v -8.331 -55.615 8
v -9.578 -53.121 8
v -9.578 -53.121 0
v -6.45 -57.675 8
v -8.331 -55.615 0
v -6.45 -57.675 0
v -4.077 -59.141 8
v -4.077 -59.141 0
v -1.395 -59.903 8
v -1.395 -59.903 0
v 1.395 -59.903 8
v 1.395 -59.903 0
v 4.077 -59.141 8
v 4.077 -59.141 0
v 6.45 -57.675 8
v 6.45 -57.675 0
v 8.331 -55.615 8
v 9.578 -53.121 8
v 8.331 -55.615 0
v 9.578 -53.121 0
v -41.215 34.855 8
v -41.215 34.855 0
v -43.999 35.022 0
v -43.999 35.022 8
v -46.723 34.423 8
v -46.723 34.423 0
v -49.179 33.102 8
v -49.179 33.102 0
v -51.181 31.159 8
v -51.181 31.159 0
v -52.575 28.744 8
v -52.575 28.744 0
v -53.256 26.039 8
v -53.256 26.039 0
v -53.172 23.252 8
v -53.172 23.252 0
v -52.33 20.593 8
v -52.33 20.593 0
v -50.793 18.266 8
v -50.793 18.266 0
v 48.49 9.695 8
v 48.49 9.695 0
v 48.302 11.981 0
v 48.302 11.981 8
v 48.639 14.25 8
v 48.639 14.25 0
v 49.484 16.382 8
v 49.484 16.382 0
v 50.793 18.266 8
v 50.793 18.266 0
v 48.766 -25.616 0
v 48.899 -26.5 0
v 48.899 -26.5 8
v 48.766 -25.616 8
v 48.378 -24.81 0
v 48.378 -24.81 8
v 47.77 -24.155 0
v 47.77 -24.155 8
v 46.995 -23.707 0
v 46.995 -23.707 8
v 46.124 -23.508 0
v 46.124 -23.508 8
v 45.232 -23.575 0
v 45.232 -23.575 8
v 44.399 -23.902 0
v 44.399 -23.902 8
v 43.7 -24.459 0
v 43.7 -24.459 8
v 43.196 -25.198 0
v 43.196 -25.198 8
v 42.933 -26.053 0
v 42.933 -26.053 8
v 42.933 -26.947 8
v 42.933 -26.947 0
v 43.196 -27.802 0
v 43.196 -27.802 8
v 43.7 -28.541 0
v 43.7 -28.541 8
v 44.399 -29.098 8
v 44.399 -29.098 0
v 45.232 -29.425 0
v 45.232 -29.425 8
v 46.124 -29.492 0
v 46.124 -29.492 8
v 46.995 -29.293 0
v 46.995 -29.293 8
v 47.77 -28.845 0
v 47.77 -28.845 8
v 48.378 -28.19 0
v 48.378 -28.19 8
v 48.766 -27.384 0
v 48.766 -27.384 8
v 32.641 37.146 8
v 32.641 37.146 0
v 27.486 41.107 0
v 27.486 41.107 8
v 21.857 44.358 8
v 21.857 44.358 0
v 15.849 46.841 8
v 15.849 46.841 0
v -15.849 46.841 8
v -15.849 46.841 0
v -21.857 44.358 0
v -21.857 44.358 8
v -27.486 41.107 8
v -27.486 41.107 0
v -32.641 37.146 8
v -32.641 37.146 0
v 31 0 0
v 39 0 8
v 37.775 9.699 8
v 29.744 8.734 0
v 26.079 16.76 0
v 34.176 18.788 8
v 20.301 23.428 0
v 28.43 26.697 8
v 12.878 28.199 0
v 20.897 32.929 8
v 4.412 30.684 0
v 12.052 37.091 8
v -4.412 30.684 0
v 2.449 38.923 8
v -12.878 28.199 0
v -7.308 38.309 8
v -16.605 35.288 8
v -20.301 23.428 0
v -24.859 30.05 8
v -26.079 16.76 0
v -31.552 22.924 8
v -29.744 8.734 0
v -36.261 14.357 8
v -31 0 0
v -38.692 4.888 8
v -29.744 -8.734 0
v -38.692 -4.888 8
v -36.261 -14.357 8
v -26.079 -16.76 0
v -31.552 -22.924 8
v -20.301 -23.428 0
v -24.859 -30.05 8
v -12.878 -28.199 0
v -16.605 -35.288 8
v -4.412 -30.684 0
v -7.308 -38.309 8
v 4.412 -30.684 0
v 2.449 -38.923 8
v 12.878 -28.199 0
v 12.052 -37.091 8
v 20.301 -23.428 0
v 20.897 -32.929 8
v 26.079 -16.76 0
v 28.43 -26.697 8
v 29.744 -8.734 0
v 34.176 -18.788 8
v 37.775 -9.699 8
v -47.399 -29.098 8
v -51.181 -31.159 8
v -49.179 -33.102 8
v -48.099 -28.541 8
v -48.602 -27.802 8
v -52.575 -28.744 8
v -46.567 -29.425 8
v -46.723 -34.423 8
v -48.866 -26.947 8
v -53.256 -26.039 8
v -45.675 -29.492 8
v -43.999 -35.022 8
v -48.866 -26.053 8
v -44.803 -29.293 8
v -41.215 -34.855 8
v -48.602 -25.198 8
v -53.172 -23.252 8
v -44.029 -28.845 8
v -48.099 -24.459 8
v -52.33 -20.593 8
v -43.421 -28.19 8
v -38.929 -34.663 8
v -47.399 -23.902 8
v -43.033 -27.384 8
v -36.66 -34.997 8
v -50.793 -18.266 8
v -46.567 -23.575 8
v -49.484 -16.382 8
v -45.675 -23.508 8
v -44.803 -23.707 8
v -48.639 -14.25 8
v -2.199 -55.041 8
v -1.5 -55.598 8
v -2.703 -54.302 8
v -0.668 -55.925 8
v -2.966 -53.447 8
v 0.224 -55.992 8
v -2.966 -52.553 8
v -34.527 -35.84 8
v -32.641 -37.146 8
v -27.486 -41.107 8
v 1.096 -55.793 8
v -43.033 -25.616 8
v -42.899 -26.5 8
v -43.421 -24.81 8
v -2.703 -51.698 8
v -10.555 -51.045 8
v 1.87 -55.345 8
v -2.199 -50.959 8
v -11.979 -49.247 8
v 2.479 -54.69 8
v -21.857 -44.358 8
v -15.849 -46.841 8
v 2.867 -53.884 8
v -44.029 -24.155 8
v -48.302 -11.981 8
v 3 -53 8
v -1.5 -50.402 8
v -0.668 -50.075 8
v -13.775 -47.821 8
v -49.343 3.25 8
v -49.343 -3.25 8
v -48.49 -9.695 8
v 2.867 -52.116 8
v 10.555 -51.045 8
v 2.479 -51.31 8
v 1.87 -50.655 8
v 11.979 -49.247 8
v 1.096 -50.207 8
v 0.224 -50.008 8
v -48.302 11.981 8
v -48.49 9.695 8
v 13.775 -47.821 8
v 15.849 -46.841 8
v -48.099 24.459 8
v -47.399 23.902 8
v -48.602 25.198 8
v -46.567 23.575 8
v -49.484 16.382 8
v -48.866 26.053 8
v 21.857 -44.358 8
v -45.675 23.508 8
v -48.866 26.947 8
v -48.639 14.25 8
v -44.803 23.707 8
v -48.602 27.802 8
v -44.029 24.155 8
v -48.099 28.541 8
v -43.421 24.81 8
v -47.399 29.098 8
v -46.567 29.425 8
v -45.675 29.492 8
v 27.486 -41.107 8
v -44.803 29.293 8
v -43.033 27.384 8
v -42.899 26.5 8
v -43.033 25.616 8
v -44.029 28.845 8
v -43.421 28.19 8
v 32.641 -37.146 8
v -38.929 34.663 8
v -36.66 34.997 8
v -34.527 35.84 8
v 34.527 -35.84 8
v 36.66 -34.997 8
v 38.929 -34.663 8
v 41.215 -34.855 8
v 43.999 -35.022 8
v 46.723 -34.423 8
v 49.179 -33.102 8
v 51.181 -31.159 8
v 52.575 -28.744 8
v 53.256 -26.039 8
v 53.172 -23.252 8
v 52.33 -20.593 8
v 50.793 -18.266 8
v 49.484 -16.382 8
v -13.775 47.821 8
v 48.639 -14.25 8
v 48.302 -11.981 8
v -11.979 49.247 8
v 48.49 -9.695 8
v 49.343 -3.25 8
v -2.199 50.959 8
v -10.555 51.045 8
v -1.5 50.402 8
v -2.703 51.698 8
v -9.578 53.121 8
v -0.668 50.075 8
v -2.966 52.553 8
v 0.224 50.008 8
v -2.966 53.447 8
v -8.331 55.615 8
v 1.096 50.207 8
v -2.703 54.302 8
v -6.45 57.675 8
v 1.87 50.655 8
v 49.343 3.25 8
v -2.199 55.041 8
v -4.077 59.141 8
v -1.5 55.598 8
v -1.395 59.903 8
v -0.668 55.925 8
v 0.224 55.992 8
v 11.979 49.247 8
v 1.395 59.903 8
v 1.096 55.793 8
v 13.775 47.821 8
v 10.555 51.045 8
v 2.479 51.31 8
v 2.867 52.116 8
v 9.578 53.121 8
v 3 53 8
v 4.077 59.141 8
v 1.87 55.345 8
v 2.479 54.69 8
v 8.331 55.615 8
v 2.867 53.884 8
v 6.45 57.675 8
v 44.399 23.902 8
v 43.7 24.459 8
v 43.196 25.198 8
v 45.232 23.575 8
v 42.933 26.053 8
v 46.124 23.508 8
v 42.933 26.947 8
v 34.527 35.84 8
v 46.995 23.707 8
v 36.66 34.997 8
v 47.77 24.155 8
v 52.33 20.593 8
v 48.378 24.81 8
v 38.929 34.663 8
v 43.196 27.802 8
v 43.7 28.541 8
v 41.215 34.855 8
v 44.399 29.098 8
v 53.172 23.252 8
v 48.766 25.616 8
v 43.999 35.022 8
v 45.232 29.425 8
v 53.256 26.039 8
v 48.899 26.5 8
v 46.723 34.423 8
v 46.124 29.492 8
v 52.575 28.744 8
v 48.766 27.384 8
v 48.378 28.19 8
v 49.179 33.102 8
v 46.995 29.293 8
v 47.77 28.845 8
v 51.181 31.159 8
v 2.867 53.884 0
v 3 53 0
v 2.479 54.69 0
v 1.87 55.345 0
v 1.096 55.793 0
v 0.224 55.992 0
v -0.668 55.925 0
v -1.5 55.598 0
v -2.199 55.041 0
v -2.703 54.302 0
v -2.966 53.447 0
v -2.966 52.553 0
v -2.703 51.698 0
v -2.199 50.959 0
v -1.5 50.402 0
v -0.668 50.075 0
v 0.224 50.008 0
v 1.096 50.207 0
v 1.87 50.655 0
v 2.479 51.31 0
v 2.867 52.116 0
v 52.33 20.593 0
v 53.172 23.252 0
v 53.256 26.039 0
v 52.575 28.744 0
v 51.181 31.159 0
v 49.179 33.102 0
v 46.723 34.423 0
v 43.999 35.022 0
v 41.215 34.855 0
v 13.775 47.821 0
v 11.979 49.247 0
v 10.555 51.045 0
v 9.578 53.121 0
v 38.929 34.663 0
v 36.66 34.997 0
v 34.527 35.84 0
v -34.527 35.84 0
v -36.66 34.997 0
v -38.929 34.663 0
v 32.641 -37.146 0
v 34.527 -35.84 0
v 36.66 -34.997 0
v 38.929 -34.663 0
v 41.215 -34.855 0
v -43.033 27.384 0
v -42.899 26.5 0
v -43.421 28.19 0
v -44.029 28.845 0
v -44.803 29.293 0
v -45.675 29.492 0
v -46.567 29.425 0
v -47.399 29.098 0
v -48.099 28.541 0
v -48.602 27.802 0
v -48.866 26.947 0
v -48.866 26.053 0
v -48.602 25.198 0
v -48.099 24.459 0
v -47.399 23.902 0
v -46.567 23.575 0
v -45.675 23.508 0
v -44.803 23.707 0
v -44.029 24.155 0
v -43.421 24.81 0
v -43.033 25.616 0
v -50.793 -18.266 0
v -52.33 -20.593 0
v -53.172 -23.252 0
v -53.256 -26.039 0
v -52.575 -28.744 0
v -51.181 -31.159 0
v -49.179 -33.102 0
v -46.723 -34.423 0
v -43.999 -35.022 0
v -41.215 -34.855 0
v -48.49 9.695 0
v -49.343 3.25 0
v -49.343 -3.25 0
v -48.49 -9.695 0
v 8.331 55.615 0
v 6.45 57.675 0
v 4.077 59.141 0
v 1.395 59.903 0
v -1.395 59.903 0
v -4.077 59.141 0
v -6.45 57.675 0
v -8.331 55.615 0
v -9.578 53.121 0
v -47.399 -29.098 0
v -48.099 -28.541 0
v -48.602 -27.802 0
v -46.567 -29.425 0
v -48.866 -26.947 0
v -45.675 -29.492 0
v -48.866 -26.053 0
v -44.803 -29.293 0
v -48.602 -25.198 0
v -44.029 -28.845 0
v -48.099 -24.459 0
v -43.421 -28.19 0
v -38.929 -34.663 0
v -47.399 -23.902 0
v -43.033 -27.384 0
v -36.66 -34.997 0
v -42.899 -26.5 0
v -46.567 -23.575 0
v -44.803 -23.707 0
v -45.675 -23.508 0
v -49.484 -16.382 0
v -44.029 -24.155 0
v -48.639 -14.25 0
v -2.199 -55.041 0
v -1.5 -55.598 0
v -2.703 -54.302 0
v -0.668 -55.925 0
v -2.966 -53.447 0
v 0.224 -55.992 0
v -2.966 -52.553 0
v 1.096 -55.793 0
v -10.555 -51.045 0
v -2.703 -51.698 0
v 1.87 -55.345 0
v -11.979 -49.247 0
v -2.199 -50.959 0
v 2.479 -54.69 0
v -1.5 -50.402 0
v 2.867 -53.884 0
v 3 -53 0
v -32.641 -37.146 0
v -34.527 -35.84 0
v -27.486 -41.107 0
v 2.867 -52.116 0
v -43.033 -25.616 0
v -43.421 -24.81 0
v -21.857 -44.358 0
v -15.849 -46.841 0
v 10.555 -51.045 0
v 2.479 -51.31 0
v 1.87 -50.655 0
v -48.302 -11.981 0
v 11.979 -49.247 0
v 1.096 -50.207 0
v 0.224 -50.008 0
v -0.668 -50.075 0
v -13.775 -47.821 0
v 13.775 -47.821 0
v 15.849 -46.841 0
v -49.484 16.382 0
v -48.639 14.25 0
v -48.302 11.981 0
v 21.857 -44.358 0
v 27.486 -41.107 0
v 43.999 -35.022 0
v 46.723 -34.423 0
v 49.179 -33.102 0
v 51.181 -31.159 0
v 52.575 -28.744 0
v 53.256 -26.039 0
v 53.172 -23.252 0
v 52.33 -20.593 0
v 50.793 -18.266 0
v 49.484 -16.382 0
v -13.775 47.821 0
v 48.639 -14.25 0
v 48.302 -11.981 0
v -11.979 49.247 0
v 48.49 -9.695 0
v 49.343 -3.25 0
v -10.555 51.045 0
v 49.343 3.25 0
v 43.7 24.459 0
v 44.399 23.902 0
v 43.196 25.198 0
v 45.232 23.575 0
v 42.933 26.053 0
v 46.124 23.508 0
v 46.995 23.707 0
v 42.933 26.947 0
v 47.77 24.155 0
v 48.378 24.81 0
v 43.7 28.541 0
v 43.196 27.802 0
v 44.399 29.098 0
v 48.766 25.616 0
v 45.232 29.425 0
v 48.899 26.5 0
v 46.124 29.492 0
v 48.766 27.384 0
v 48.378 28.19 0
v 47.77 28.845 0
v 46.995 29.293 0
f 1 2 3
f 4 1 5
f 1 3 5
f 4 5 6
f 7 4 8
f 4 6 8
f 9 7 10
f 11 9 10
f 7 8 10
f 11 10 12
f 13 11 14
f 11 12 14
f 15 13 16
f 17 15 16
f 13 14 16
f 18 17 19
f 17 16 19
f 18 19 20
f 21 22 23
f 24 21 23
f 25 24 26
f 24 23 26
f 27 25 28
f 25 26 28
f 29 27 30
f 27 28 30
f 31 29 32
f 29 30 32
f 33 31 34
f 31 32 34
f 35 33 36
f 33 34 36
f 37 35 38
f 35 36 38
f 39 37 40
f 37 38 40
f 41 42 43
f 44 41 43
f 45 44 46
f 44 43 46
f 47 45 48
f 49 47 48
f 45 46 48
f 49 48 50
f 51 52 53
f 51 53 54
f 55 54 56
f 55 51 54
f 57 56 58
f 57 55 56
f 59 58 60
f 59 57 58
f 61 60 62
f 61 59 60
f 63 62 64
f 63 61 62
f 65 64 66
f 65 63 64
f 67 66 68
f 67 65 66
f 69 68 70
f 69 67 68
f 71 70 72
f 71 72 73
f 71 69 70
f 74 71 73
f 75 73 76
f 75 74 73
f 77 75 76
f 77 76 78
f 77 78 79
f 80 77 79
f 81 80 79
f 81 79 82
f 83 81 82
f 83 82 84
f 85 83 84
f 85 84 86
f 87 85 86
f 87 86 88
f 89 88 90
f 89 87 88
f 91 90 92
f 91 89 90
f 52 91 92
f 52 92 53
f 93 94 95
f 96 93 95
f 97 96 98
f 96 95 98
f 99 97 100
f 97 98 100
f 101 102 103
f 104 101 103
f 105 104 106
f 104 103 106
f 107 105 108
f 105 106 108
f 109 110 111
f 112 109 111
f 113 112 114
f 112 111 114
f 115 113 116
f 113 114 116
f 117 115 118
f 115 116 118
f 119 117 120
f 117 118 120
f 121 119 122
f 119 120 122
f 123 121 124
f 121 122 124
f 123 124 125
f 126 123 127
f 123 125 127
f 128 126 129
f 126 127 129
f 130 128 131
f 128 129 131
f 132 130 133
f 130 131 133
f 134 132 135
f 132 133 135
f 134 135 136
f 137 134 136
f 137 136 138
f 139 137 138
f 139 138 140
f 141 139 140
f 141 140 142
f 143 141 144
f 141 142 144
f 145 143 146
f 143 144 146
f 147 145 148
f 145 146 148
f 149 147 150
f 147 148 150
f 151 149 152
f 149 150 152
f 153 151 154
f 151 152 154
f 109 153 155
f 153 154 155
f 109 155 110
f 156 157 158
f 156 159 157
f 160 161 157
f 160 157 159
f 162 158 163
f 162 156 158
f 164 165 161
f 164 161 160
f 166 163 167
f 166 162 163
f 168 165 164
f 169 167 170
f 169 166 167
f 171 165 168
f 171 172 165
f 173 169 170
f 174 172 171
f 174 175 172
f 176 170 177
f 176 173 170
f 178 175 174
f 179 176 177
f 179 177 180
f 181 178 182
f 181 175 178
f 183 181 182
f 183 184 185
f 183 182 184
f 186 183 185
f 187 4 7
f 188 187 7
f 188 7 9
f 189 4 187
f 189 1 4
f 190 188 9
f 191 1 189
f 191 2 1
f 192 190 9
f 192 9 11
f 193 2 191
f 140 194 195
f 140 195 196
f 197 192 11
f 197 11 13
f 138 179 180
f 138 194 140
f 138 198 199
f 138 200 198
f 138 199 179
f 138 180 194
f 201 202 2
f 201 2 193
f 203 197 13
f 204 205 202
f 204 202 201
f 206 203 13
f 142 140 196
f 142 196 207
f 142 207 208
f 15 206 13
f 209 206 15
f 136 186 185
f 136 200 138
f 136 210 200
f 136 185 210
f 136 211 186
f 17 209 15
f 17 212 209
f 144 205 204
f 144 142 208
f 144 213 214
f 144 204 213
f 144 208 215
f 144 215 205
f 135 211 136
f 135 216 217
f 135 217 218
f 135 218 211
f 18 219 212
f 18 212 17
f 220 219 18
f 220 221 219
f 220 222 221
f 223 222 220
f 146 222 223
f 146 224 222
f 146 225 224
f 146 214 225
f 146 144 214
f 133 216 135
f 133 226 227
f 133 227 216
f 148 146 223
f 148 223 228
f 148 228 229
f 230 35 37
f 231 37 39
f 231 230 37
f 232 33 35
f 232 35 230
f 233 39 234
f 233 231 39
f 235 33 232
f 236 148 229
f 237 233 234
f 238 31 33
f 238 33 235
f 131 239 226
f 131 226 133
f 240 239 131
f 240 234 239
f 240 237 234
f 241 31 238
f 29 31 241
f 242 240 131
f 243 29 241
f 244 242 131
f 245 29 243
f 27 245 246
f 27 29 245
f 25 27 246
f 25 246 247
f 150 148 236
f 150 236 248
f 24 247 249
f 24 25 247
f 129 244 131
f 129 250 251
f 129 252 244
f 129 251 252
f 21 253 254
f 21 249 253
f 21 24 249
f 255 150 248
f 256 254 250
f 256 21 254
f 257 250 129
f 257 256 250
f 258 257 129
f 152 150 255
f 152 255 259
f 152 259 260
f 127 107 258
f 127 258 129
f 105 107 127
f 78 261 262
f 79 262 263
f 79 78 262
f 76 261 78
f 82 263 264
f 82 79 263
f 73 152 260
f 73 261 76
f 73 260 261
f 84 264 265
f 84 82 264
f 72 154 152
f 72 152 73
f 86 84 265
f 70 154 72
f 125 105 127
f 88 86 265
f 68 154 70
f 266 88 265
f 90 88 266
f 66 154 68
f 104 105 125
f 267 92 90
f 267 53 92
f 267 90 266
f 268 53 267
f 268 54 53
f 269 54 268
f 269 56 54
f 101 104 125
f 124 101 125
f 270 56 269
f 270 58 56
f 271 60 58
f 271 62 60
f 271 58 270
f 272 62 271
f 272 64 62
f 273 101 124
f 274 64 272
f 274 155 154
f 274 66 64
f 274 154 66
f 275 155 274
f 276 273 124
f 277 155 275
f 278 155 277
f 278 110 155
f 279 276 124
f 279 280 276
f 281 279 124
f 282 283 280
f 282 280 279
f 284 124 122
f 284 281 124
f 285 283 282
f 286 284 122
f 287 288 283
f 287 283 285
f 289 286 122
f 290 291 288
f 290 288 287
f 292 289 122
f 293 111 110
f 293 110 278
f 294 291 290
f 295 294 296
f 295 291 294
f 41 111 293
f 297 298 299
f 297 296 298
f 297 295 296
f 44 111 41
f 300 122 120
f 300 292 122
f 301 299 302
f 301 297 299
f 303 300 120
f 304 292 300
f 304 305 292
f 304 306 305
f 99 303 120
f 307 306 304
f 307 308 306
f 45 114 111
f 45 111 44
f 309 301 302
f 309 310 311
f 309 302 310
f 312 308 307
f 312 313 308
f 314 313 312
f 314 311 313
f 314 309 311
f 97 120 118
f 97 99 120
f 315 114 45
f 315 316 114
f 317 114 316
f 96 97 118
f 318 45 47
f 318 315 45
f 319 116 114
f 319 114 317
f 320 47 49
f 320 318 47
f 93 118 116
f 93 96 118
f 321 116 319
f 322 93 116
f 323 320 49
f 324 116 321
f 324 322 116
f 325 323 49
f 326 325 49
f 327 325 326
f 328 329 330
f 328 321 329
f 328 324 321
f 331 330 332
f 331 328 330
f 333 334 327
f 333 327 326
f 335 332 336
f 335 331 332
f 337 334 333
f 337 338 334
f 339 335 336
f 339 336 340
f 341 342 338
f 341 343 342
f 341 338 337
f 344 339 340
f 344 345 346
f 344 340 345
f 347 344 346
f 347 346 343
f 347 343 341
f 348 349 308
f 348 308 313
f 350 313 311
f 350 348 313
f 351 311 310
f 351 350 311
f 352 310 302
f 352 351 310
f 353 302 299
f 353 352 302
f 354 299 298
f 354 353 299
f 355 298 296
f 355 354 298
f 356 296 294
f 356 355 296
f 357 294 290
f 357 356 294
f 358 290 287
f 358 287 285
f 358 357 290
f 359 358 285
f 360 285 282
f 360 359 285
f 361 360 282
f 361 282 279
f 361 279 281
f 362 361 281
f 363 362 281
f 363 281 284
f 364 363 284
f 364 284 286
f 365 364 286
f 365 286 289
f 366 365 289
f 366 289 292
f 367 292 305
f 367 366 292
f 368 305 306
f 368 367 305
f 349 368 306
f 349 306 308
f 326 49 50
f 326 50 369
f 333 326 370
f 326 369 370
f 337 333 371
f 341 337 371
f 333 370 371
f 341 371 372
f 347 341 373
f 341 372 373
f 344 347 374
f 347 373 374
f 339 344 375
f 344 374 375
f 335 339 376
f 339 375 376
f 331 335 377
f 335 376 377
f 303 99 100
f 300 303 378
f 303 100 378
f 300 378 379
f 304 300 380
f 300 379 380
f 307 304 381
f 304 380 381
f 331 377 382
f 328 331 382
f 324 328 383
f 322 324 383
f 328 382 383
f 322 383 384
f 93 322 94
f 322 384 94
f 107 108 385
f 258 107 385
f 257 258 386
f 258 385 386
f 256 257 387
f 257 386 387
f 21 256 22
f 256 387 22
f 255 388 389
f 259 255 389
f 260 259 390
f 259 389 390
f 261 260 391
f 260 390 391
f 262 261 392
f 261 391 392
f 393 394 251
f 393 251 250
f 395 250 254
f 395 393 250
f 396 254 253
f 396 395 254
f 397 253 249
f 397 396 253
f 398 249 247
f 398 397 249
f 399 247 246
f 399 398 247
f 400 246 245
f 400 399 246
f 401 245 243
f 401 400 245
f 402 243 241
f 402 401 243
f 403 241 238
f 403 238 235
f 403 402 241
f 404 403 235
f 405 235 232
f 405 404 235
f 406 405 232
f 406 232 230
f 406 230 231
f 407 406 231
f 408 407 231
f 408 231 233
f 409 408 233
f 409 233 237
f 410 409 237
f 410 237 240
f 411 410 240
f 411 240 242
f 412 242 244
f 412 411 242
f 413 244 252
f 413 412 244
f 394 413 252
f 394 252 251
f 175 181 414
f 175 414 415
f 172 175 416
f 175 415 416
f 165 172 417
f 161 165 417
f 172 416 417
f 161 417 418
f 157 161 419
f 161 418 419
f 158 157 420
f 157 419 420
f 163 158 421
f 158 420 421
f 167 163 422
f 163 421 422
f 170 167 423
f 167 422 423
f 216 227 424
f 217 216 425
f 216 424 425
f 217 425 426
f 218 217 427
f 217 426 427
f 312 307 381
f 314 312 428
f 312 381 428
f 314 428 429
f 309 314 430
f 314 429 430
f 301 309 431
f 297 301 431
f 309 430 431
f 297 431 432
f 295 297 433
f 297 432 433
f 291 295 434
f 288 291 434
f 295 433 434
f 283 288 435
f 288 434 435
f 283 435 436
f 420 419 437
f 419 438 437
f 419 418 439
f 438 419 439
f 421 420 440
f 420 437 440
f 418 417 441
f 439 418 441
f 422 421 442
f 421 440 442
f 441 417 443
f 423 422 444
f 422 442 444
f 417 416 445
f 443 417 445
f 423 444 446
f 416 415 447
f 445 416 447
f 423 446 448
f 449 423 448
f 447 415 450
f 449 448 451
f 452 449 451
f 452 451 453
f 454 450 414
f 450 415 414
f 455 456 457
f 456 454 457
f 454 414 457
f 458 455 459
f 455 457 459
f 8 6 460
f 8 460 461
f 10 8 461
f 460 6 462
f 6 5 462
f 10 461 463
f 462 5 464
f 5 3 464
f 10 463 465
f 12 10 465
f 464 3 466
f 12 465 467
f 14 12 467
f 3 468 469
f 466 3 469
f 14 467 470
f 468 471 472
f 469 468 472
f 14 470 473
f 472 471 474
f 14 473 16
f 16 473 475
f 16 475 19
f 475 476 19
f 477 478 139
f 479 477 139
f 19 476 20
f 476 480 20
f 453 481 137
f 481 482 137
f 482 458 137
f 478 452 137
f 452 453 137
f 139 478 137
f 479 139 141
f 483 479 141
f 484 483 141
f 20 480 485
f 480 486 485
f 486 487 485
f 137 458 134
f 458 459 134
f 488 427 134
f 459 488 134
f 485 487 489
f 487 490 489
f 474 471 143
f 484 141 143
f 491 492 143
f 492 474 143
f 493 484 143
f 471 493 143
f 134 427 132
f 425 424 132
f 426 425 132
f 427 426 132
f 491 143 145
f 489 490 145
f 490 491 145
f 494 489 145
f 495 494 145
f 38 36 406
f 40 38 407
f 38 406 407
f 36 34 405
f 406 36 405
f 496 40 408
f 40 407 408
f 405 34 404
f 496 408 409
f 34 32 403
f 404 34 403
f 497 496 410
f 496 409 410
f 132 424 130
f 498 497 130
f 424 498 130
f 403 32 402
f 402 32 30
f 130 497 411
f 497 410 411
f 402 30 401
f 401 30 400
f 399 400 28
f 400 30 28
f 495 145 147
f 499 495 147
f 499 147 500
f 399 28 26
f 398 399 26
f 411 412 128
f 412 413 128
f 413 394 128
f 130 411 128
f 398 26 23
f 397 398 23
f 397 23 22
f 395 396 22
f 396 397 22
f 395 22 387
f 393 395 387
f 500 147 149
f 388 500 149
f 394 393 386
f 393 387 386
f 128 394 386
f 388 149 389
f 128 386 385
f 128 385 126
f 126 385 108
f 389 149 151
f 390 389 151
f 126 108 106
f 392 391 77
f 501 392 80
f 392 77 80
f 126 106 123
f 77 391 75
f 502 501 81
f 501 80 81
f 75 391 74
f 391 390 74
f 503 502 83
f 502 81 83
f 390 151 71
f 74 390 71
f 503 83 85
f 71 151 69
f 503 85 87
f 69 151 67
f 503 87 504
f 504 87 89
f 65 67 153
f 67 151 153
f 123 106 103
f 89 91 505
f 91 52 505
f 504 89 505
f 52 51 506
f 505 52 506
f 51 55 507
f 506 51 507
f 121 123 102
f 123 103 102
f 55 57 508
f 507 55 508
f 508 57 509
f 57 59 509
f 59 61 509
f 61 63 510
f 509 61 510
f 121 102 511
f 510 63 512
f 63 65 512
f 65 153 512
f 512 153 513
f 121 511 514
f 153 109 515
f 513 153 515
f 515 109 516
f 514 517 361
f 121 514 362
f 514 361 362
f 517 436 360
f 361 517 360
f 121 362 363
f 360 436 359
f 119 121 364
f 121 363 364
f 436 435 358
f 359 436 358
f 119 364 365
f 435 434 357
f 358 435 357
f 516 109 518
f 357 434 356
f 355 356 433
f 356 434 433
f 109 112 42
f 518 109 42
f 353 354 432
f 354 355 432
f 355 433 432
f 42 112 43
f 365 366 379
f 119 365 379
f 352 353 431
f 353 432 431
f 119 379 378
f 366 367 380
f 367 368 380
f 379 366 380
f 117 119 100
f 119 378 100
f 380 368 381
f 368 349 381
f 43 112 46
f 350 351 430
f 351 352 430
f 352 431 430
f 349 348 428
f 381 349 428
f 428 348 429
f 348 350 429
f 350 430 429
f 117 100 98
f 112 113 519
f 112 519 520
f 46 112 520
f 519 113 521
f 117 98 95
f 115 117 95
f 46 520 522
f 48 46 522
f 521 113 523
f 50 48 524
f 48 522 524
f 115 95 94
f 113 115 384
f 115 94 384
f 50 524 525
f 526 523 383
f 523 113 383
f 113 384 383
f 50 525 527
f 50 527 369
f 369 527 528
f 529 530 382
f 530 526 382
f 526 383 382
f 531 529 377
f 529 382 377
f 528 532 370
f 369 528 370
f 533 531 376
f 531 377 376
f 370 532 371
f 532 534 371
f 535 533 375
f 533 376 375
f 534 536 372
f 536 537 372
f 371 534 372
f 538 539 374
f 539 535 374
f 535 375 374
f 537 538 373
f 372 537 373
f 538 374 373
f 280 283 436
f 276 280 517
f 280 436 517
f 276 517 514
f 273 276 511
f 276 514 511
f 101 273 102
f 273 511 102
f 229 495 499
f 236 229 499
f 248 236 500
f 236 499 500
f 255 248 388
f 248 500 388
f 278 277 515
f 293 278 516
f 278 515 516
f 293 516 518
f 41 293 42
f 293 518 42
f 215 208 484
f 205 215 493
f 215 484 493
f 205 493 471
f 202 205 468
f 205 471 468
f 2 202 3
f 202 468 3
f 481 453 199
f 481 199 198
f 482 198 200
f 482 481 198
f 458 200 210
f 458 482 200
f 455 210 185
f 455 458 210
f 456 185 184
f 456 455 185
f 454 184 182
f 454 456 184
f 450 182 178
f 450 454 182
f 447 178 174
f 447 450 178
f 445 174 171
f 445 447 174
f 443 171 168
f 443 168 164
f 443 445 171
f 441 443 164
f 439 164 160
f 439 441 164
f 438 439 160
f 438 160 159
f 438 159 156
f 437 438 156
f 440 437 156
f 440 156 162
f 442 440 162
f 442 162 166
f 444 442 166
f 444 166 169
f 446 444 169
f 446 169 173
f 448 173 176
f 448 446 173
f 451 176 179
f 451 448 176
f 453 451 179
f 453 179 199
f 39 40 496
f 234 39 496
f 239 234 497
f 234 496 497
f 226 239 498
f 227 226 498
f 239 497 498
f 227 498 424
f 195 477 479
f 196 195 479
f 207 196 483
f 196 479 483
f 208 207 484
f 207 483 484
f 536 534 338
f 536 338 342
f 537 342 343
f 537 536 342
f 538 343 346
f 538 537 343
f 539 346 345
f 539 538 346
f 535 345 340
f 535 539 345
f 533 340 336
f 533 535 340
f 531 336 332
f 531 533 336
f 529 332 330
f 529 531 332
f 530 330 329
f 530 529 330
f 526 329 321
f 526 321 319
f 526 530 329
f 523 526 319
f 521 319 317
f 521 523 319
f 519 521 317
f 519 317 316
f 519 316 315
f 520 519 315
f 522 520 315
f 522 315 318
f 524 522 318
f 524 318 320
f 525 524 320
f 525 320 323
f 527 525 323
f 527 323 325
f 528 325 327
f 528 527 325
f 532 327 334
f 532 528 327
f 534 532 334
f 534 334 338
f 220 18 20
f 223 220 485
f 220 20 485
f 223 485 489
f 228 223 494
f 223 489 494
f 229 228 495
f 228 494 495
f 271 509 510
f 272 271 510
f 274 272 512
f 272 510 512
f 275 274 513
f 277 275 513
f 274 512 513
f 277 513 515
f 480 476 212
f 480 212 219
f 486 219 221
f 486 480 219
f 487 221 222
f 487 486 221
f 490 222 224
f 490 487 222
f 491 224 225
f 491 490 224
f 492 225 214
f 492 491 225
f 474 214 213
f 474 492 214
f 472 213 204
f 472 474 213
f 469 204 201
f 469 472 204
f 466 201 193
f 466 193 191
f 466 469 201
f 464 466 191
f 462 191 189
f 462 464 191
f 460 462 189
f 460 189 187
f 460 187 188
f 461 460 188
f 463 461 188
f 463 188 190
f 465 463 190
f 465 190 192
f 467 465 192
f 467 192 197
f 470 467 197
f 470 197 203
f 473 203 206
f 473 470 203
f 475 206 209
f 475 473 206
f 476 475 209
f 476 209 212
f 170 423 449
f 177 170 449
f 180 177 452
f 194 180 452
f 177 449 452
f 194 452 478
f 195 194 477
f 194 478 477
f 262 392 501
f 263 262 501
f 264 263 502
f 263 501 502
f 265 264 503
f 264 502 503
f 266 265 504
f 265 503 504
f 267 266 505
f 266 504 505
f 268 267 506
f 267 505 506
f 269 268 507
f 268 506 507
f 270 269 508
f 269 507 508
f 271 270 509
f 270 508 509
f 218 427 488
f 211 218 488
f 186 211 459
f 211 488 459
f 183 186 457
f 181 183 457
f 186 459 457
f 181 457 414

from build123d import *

# Parameters (mm, degrees)
SKETCH2_R           = 3
SKETCH2_R_2         = 31
BOSS_EXTRUDE1_DEPTH = 8
CHAMFER1_SIZE       = 8


with BuildPart() as part:
    # Sketch2 → Boss-Extrude1 (new body)
    with BuildSketch(Plane.XY):
        with BuildLine():
            ThreePointArc((50.792573497, 18.265840665), (51.961524227, 30), (41.214968786, 34.85473864))
            ThreePointArc((41.214968786, 34.85473864), (36.65999643, 34.997336465), (32.641290086, 37.146314508))
            ThreePointArc((32.641290086, 37.146314508), (24.725, 42.824956217), (15.849006977, 46.841343681))
            ThreePointArc((15.849006977, 46.841343681), (11.978584229, 49.247156444), (9.577604711, 53.120579305))
            ThreePointArc((9.577604711, 53.120579305), (0, 60), (-9.577604711, 53.120579305))
            ThreePointArc((-9.577604711, 53.120579305), (-11.978584229, 49.247156444), (-15.849006977, 46.841343681))
            ThreePointArc((-15.849006977, 46.841343681), (-24.725, 42.824956217), (-32.641290086, 37.146314508))
            ThreePointArc((-32.641290086, 37.146314508), (-36.65999643, 34.997336465), (-41.214968786, 34.85473864))
            ThreePointArc((-41.214968786, 34.85473864), (-51.961524227, 30), (-50.792573497, 18.265840665))
            ThreePointArc((-50.792573497, 18.265840665), (-48.638580659, 14.249819979), (-48.490297064, 9.695029173))
            ThreePointArc((-48.490297064, 9.695029173), (-49.45, 0), (-48.490297064, -9.695029173))
            ThreePointArc((-48.490297064, -9.695029173), (-48.638580659, -14.249819979), (-50.792573497, -18.265840665))
            ThreePointArc((-50.792573497, -18.265840665), (-51.961524227, -30), (-41.214968786, -34.85473864))
            ThreePointArc((-41.214968786, -34.85473864), (-36.65999643, -34.997336465), (-32.641290086, -37.146314508))
            ThreePointArc((-32.641290086, -37.146314508), (-24.725, -42.824956217), (-15.849006977, -46.841343681))
            ThreePointArc((-15.849006977, -46.841343681), (-11.978584229, -49.247156444), (-9.577604711, -53.120579305))
            ThreePointArc((-9.577604711, -53.120579305), (0, -60), (9.577604711, -53.120579305))
            ThreePointArc((9.577604711, -53.120579305), (11.978584229, -49.247156444), (15.849006977, -46.841343681))
            ThreePointArc((15.849006977, -46.841343681), (24.725, -42.824956217), (32.641290086, -37.146314508))
            ThreePointArc((32.641290086, -37.146314508), (36.65999643, -34.997336465), (41.214968786, -34.85473864))
            ThreePointArc((41.214968786, -34.85473864), (51.961524227, -30), (50.792573497, -18.265840665))
            ThreePointArc((50.792573497, -18.265840665), (48.638580659, -14.249819979), (48.490297064, -9.695029173))
            ThreePointArc((48.490297064, -9.695029173), (49.45, 0), (48.490297064, 9.695029173))
            ThreePointArc((48.490297064, 9.695029173), (48.638580659, 14.249819979), (50.792573497, 18.265840665))
        make_face()
        with Locations((45.899346401, 26.5)):
            Circle(SKETCH2_R, mode=Mode.SUBTRACT)
        with Locations((0, 53)):
            Circle(SKETCH2_R, mode=Mode.SUBTRACT)
        Circle(SKETCH2_R_2, mode=Mode.SUBTRACT)
        with Locations((45.899346401, -26.5)):
            Circle(SKETCH2_R, mode=Mode.SUBTRACT)
        with Locations((0, -53)):
            Circle(SKETCH2_R, mode=Mode.SUBTRACT)
        with Locations((-45.899346401, 26.5)):
            Circle(SKETCH2_R, mode=Mode.SUBTRACT)
        with Locations((-45.899346401, -26.5)):
            Circle(SKETCH2_R, mode=Mode.SUBTRACT)
    extrude(amount=BOSS_EXTRUDE1_DEPTH)

    # Chamfer1
    chamfer1_edges = [part.edges().sort_by_distance(p)[0] for p in [
        (-31, 0, 8),
    ]]
    chamfer(chamfer1_edges, length=CHAMFER1_SIZE - 0.0001)  # a hair under: the kernel refuses the full size


solid = part.part
